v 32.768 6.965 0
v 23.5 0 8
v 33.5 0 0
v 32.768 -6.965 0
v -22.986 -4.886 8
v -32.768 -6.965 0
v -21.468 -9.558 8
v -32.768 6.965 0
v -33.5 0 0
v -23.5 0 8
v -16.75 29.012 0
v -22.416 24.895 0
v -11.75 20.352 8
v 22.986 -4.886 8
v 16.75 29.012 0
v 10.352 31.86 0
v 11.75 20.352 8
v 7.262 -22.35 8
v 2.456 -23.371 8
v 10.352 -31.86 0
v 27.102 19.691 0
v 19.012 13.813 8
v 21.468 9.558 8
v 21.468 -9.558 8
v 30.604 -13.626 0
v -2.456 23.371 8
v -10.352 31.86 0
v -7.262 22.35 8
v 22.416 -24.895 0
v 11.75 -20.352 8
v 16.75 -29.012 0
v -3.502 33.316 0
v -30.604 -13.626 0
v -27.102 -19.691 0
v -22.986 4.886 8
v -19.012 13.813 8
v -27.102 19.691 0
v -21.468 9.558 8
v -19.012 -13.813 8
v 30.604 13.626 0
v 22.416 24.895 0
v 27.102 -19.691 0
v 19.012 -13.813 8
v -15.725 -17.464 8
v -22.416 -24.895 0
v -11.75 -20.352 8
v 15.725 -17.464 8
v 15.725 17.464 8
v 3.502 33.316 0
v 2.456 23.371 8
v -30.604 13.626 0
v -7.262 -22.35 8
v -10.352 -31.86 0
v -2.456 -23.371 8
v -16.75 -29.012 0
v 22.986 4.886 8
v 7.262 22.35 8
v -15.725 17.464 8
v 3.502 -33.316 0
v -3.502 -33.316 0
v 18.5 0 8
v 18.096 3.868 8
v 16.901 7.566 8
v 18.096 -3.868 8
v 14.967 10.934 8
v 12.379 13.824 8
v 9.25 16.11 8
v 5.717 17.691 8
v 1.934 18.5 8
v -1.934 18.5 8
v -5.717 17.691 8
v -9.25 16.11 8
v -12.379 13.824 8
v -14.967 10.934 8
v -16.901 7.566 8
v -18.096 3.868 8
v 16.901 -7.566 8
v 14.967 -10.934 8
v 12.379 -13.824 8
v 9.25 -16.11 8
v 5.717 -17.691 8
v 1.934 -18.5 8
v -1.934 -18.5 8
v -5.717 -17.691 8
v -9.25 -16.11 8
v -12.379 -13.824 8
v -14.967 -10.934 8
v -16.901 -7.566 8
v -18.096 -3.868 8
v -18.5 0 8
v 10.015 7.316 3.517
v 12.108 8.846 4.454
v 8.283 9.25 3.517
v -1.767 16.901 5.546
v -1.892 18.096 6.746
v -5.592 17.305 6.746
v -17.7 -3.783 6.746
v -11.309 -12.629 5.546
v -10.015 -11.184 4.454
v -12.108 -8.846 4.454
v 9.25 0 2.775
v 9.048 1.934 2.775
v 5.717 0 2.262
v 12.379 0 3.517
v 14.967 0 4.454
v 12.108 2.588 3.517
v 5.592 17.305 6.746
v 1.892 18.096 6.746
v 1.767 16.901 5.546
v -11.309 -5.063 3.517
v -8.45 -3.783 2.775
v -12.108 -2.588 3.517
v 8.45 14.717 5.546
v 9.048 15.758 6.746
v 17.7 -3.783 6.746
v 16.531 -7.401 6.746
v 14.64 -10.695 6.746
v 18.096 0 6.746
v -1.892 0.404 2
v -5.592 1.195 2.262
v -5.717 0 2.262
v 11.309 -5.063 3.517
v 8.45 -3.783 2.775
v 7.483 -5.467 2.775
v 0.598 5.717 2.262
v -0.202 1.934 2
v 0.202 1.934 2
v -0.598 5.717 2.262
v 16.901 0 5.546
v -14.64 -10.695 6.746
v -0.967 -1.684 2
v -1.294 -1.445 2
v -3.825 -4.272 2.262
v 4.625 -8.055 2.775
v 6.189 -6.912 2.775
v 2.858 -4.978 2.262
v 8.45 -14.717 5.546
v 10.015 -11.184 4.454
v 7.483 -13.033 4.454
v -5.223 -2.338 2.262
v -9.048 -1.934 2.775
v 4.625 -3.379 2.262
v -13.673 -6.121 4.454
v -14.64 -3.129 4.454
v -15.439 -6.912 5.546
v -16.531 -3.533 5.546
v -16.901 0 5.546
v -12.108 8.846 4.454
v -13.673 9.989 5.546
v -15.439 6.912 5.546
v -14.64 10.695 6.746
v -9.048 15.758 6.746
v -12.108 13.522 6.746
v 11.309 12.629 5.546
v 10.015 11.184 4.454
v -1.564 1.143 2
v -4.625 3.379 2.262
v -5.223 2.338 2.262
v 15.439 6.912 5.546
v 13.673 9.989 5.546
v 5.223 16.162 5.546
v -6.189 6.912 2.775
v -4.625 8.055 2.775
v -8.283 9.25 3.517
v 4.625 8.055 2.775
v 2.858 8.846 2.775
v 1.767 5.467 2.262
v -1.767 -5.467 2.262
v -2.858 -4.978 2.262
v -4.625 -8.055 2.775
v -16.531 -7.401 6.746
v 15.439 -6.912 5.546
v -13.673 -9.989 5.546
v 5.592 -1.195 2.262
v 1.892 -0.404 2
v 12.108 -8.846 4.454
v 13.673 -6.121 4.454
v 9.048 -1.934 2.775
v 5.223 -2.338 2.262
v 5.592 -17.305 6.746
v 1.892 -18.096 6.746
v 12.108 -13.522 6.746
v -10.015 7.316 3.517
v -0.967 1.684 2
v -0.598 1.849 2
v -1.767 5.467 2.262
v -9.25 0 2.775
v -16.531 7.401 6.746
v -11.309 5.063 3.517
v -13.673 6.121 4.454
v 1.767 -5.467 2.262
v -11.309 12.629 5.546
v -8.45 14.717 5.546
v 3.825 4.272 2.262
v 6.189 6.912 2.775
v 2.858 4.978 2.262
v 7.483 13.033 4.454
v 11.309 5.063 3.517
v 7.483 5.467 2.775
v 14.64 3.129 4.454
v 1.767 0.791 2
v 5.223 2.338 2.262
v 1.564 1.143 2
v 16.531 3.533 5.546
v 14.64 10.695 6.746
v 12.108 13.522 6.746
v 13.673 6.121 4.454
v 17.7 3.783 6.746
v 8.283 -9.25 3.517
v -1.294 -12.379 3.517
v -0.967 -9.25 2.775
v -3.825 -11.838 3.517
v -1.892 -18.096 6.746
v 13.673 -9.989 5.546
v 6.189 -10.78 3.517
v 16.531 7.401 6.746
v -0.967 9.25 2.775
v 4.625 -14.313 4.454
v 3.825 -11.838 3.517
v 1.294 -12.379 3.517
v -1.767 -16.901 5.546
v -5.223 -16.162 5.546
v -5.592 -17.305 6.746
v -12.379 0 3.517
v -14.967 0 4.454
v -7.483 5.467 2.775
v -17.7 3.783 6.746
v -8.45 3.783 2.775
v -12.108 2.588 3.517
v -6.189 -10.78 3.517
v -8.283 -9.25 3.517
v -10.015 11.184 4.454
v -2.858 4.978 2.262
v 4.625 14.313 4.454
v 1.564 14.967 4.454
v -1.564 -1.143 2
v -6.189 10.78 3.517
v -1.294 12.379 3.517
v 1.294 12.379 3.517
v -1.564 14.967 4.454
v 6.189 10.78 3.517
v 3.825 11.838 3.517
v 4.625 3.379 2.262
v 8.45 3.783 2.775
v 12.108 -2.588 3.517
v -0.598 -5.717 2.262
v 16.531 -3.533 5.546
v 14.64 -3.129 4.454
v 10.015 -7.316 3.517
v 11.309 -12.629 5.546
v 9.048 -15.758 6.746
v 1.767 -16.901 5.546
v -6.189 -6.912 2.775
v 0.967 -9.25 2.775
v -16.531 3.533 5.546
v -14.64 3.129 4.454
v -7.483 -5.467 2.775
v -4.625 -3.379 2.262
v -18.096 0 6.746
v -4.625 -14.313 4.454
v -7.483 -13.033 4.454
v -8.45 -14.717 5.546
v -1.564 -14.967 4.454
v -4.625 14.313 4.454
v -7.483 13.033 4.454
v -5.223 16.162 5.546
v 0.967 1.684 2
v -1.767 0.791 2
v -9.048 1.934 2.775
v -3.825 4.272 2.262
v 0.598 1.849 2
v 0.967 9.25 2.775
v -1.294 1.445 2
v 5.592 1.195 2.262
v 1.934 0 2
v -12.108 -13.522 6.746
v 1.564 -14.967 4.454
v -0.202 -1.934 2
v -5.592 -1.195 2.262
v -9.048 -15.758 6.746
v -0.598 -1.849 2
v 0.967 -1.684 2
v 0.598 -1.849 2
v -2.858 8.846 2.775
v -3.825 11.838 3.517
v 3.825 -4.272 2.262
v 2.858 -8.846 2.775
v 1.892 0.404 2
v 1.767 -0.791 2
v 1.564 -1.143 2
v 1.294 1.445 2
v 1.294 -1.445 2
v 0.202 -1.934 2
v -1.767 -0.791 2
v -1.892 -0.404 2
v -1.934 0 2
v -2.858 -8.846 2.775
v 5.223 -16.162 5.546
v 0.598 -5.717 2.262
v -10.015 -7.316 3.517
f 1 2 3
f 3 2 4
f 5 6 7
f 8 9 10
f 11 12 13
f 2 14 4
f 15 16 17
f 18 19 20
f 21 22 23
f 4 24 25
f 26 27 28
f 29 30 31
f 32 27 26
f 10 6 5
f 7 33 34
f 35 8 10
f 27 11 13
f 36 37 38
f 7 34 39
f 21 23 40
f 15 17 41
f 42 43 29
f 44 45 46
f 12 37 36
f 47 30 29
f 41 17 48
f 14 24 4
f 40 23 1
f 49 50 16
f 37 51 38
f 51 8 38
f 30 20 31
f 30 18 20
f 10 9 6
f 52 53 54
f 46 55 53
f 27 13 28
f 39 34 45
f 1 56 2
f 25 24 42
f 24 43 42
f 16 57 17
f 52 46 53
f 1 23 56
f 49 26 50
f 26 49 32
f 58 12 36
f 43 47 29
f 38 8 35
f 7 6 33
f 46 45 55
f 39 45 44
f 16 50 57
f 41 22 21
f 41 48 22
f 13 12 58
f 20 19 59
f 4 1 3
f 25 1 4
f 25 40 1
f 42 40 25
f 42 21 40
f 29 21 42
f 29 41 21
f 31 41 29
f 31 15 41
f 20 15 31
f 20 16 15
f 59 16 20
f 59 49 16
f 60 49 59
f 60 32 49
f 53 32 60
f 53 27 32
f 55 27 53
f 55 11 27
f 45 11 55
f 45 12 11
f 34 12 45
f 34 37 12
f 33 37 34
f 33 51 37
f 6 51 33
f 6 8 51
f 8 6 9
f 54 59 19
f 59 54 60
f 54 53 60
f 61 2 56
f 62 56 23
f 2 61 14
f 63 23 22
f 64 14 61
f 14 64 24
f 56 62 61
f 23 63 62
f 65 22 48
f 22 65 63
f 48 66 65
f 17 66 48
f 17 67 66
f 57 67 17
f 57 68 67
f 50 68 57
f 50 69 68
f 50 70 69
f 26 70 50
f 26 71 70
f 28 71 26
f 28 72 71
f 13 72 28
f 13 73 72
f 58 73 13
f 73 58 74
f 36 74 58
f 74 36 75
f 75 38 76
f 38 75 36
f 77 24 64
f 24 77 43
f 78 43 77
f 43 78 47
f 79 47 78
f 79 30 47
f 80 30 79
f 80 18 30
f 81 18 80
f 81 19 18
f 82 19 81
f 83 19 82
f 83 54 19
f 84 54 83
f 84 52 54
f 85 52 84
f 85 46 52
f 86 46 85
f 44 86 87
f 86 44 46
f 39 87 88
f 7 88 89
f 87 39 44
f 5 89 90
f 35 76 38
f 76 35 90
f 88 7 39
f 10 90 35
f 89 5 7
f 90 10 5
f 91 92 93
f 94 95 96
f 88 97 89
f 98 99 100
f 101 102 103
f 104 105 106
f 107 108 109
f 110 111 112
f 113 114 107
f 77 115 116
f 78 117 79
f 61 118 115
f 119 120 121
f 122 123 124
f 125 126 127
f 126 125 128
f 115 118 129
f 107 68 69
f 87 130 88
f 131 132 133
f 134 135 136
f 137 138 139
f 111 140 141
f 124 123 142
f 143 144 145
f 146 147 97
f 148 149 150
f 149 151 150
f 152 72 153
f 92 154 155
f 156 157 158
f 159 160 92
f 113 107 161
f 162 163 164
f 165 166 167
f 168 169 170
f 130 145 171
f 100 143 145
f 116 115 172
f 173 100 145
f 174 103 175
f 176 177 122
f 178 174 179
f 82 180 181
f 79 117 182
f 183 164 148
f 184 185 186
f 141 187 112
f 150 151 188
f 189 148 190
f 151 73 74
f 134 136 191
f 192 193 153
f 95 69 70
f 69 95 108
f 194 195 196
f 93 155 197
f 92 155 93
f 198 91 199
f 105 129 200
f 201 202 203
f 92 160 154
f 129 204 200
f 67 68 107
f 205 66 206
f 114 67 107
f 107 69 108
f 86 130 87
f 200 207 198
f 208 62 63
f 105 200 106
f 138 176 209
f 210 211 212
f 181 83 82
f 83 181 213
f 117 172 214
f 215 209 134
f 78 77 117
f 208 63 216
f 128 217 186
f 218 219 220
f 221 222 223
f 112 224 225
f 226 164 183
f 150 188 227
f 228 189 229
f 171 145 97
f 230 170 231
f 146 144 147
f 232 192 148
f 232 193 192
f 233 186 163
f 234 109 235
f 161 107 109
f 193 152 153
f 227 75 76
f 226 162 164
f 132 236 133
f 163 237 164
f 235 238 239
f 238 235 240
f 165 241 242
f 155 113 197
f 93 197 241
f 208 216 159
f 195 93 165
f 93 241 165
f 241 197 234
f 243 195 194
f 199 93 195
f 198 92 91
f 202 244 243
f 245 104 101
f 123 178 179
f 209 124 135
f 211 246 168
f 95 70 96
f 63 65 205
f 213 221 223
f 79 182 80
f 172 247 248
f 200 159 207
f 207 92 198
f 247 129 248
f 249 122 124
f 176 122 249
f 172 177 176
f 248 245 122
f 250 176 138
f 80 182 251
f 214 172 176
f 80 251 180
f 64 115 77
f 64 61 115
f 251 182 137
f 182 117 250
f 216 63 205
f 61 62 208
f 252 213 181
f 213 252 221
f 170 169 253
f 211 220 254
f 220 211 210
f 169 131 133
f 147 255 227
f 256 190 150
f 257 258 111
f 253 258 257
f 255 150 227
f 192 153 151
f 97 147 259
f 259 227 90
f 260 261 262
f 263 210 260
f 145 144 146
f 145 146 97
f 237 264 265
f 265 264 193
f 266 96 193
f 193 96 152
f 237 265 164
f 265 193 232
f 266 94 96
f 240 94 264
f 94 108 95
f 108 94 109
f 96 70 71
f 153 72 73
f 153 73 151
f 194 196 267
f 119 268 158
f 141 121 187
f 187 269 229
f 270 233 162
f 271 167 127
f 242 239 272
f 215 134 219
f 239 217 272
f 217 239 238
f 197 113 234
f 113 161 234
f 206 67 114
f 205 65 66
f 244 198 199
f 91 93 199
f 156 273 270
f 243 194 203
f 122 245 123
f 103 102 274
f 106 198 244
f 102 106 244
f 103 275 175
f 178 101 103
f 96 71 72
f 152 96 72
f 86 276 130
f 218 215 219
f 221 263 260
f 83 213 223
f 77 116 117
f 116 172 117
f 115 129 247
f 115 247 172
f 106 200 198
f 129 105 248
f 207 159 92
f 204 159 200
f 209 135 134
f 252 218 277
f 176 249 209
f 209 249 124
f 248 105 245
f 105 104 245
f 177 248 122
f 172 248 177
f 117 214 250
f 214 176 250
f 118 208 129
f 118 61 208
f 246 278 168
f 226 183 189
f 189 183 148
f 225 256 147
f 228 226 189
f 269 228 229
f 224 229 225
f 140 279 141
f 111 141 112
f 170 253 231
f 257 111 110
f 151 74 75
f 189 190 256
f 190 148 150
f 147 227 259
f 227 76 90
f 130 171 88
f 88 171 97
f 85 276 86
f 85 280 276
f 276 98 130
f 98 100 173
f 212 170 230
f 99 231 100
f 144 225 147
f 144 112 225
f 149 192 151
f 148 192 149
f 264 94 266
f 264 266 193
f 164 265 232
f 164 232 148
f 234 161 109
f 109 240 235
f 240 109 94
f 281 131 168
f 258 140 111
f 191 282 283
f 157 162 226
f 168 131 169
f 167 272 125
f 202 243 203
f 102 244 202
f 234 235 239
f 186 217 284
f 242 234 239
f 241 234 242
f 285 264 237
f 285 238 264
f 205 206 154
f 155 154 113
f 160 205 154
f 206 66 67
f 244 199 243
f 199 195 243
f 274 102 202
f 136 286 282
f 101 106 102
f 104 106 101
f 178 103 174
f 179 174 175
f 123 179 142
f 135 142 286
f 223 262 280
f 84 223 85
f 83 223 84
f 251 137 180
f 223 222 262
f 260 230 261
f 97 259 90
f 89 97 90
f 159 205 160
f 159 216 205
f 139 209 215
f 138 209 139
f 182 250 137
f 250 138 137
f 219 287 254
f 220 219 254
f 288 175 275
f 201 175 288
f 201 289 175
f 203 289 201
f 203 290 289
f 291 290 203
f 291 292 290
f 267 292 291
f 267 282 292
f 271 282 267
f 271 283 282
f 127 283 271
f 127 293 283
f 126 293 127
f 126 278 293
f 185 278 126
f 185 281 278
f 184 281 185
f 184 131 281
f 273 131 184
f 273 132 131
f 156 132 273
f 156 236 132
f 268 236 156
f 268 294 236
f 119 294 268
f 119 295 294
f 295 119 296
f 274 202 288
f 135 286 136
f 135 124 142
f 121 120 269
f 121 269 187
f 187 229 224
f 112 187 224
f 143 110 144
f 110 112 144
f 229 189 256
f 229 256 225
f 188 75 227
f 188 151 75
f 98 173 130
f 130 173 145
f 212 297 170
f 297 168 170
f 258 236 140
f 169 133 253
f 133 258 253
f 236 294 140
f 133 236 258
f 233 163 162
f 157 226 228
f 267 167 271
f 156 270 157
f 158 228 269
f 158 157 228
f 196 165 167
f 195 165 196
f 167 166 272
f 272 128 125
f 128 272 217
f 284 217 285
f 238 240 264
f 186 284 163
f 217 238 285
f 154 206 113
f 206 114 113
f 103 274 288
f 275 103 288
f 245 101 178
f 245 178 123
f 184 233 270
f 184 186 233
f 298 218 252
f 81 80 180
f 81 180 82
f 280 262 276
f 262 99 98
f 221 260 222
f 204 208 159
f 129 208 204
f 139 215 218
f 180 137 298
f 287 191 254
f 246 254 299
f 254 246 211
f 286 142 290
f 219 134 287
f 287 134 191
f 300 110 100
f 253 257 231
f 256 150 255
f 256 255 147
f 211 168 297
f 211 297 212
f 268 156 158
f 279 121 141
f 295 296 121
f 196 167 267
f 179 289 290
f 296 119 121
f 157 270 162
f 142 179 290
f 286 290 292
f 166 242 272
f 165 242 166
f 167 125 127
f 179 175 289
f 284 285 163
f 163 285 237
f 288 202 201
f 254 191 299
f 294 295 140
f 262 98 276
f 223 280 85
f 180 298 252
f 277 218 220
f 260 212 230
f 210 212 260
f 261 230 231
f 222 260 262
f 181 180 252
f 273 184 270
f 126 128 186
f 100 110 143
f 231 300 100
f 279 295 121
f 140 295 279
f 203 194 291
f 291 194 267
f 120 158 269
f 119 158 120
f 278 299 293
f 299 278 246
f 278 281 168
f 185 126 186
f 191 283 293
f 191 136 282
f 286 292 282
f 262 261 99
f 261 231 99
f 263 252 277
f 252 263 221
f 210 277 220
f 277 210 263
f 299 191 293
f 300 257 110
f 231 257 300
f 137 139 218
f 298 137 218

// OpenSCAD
// [FL_INDEX: keywords="openscad, 3d_parametric, Ant_Poison_Trap_Customizer, csg_solid" | COT="Parametric OpenSCAD design from 3DCodeverse"]
// Title: Ant Poison Trap Customizer

//Height of the ant trap:
height = 8;

//Width of the ant trap:
diameter = 67;

//How wide should the lip be?
lip_width = 5;

//How much material under the lowest point of the dish?
min_bottom = 2;

//How much wider is the base than the top of the dish?
base_enlargement = 10;

difference(){

//base of trap:
translate([0,0, height/2]) 
	cylinder(h = height, r1 = diameter/2, r2 = diameter/2-base_enlargement, center = true);

//Poison well:
translate([0,0, height])
	resize(newsize = [diameter-((lip_width+base_enlargement)*2), diameter-((lip_width+base_enlargement)*2), (height*2)-(min_bottom * 2)]) 
		sphere(r=10, center=true);

}
